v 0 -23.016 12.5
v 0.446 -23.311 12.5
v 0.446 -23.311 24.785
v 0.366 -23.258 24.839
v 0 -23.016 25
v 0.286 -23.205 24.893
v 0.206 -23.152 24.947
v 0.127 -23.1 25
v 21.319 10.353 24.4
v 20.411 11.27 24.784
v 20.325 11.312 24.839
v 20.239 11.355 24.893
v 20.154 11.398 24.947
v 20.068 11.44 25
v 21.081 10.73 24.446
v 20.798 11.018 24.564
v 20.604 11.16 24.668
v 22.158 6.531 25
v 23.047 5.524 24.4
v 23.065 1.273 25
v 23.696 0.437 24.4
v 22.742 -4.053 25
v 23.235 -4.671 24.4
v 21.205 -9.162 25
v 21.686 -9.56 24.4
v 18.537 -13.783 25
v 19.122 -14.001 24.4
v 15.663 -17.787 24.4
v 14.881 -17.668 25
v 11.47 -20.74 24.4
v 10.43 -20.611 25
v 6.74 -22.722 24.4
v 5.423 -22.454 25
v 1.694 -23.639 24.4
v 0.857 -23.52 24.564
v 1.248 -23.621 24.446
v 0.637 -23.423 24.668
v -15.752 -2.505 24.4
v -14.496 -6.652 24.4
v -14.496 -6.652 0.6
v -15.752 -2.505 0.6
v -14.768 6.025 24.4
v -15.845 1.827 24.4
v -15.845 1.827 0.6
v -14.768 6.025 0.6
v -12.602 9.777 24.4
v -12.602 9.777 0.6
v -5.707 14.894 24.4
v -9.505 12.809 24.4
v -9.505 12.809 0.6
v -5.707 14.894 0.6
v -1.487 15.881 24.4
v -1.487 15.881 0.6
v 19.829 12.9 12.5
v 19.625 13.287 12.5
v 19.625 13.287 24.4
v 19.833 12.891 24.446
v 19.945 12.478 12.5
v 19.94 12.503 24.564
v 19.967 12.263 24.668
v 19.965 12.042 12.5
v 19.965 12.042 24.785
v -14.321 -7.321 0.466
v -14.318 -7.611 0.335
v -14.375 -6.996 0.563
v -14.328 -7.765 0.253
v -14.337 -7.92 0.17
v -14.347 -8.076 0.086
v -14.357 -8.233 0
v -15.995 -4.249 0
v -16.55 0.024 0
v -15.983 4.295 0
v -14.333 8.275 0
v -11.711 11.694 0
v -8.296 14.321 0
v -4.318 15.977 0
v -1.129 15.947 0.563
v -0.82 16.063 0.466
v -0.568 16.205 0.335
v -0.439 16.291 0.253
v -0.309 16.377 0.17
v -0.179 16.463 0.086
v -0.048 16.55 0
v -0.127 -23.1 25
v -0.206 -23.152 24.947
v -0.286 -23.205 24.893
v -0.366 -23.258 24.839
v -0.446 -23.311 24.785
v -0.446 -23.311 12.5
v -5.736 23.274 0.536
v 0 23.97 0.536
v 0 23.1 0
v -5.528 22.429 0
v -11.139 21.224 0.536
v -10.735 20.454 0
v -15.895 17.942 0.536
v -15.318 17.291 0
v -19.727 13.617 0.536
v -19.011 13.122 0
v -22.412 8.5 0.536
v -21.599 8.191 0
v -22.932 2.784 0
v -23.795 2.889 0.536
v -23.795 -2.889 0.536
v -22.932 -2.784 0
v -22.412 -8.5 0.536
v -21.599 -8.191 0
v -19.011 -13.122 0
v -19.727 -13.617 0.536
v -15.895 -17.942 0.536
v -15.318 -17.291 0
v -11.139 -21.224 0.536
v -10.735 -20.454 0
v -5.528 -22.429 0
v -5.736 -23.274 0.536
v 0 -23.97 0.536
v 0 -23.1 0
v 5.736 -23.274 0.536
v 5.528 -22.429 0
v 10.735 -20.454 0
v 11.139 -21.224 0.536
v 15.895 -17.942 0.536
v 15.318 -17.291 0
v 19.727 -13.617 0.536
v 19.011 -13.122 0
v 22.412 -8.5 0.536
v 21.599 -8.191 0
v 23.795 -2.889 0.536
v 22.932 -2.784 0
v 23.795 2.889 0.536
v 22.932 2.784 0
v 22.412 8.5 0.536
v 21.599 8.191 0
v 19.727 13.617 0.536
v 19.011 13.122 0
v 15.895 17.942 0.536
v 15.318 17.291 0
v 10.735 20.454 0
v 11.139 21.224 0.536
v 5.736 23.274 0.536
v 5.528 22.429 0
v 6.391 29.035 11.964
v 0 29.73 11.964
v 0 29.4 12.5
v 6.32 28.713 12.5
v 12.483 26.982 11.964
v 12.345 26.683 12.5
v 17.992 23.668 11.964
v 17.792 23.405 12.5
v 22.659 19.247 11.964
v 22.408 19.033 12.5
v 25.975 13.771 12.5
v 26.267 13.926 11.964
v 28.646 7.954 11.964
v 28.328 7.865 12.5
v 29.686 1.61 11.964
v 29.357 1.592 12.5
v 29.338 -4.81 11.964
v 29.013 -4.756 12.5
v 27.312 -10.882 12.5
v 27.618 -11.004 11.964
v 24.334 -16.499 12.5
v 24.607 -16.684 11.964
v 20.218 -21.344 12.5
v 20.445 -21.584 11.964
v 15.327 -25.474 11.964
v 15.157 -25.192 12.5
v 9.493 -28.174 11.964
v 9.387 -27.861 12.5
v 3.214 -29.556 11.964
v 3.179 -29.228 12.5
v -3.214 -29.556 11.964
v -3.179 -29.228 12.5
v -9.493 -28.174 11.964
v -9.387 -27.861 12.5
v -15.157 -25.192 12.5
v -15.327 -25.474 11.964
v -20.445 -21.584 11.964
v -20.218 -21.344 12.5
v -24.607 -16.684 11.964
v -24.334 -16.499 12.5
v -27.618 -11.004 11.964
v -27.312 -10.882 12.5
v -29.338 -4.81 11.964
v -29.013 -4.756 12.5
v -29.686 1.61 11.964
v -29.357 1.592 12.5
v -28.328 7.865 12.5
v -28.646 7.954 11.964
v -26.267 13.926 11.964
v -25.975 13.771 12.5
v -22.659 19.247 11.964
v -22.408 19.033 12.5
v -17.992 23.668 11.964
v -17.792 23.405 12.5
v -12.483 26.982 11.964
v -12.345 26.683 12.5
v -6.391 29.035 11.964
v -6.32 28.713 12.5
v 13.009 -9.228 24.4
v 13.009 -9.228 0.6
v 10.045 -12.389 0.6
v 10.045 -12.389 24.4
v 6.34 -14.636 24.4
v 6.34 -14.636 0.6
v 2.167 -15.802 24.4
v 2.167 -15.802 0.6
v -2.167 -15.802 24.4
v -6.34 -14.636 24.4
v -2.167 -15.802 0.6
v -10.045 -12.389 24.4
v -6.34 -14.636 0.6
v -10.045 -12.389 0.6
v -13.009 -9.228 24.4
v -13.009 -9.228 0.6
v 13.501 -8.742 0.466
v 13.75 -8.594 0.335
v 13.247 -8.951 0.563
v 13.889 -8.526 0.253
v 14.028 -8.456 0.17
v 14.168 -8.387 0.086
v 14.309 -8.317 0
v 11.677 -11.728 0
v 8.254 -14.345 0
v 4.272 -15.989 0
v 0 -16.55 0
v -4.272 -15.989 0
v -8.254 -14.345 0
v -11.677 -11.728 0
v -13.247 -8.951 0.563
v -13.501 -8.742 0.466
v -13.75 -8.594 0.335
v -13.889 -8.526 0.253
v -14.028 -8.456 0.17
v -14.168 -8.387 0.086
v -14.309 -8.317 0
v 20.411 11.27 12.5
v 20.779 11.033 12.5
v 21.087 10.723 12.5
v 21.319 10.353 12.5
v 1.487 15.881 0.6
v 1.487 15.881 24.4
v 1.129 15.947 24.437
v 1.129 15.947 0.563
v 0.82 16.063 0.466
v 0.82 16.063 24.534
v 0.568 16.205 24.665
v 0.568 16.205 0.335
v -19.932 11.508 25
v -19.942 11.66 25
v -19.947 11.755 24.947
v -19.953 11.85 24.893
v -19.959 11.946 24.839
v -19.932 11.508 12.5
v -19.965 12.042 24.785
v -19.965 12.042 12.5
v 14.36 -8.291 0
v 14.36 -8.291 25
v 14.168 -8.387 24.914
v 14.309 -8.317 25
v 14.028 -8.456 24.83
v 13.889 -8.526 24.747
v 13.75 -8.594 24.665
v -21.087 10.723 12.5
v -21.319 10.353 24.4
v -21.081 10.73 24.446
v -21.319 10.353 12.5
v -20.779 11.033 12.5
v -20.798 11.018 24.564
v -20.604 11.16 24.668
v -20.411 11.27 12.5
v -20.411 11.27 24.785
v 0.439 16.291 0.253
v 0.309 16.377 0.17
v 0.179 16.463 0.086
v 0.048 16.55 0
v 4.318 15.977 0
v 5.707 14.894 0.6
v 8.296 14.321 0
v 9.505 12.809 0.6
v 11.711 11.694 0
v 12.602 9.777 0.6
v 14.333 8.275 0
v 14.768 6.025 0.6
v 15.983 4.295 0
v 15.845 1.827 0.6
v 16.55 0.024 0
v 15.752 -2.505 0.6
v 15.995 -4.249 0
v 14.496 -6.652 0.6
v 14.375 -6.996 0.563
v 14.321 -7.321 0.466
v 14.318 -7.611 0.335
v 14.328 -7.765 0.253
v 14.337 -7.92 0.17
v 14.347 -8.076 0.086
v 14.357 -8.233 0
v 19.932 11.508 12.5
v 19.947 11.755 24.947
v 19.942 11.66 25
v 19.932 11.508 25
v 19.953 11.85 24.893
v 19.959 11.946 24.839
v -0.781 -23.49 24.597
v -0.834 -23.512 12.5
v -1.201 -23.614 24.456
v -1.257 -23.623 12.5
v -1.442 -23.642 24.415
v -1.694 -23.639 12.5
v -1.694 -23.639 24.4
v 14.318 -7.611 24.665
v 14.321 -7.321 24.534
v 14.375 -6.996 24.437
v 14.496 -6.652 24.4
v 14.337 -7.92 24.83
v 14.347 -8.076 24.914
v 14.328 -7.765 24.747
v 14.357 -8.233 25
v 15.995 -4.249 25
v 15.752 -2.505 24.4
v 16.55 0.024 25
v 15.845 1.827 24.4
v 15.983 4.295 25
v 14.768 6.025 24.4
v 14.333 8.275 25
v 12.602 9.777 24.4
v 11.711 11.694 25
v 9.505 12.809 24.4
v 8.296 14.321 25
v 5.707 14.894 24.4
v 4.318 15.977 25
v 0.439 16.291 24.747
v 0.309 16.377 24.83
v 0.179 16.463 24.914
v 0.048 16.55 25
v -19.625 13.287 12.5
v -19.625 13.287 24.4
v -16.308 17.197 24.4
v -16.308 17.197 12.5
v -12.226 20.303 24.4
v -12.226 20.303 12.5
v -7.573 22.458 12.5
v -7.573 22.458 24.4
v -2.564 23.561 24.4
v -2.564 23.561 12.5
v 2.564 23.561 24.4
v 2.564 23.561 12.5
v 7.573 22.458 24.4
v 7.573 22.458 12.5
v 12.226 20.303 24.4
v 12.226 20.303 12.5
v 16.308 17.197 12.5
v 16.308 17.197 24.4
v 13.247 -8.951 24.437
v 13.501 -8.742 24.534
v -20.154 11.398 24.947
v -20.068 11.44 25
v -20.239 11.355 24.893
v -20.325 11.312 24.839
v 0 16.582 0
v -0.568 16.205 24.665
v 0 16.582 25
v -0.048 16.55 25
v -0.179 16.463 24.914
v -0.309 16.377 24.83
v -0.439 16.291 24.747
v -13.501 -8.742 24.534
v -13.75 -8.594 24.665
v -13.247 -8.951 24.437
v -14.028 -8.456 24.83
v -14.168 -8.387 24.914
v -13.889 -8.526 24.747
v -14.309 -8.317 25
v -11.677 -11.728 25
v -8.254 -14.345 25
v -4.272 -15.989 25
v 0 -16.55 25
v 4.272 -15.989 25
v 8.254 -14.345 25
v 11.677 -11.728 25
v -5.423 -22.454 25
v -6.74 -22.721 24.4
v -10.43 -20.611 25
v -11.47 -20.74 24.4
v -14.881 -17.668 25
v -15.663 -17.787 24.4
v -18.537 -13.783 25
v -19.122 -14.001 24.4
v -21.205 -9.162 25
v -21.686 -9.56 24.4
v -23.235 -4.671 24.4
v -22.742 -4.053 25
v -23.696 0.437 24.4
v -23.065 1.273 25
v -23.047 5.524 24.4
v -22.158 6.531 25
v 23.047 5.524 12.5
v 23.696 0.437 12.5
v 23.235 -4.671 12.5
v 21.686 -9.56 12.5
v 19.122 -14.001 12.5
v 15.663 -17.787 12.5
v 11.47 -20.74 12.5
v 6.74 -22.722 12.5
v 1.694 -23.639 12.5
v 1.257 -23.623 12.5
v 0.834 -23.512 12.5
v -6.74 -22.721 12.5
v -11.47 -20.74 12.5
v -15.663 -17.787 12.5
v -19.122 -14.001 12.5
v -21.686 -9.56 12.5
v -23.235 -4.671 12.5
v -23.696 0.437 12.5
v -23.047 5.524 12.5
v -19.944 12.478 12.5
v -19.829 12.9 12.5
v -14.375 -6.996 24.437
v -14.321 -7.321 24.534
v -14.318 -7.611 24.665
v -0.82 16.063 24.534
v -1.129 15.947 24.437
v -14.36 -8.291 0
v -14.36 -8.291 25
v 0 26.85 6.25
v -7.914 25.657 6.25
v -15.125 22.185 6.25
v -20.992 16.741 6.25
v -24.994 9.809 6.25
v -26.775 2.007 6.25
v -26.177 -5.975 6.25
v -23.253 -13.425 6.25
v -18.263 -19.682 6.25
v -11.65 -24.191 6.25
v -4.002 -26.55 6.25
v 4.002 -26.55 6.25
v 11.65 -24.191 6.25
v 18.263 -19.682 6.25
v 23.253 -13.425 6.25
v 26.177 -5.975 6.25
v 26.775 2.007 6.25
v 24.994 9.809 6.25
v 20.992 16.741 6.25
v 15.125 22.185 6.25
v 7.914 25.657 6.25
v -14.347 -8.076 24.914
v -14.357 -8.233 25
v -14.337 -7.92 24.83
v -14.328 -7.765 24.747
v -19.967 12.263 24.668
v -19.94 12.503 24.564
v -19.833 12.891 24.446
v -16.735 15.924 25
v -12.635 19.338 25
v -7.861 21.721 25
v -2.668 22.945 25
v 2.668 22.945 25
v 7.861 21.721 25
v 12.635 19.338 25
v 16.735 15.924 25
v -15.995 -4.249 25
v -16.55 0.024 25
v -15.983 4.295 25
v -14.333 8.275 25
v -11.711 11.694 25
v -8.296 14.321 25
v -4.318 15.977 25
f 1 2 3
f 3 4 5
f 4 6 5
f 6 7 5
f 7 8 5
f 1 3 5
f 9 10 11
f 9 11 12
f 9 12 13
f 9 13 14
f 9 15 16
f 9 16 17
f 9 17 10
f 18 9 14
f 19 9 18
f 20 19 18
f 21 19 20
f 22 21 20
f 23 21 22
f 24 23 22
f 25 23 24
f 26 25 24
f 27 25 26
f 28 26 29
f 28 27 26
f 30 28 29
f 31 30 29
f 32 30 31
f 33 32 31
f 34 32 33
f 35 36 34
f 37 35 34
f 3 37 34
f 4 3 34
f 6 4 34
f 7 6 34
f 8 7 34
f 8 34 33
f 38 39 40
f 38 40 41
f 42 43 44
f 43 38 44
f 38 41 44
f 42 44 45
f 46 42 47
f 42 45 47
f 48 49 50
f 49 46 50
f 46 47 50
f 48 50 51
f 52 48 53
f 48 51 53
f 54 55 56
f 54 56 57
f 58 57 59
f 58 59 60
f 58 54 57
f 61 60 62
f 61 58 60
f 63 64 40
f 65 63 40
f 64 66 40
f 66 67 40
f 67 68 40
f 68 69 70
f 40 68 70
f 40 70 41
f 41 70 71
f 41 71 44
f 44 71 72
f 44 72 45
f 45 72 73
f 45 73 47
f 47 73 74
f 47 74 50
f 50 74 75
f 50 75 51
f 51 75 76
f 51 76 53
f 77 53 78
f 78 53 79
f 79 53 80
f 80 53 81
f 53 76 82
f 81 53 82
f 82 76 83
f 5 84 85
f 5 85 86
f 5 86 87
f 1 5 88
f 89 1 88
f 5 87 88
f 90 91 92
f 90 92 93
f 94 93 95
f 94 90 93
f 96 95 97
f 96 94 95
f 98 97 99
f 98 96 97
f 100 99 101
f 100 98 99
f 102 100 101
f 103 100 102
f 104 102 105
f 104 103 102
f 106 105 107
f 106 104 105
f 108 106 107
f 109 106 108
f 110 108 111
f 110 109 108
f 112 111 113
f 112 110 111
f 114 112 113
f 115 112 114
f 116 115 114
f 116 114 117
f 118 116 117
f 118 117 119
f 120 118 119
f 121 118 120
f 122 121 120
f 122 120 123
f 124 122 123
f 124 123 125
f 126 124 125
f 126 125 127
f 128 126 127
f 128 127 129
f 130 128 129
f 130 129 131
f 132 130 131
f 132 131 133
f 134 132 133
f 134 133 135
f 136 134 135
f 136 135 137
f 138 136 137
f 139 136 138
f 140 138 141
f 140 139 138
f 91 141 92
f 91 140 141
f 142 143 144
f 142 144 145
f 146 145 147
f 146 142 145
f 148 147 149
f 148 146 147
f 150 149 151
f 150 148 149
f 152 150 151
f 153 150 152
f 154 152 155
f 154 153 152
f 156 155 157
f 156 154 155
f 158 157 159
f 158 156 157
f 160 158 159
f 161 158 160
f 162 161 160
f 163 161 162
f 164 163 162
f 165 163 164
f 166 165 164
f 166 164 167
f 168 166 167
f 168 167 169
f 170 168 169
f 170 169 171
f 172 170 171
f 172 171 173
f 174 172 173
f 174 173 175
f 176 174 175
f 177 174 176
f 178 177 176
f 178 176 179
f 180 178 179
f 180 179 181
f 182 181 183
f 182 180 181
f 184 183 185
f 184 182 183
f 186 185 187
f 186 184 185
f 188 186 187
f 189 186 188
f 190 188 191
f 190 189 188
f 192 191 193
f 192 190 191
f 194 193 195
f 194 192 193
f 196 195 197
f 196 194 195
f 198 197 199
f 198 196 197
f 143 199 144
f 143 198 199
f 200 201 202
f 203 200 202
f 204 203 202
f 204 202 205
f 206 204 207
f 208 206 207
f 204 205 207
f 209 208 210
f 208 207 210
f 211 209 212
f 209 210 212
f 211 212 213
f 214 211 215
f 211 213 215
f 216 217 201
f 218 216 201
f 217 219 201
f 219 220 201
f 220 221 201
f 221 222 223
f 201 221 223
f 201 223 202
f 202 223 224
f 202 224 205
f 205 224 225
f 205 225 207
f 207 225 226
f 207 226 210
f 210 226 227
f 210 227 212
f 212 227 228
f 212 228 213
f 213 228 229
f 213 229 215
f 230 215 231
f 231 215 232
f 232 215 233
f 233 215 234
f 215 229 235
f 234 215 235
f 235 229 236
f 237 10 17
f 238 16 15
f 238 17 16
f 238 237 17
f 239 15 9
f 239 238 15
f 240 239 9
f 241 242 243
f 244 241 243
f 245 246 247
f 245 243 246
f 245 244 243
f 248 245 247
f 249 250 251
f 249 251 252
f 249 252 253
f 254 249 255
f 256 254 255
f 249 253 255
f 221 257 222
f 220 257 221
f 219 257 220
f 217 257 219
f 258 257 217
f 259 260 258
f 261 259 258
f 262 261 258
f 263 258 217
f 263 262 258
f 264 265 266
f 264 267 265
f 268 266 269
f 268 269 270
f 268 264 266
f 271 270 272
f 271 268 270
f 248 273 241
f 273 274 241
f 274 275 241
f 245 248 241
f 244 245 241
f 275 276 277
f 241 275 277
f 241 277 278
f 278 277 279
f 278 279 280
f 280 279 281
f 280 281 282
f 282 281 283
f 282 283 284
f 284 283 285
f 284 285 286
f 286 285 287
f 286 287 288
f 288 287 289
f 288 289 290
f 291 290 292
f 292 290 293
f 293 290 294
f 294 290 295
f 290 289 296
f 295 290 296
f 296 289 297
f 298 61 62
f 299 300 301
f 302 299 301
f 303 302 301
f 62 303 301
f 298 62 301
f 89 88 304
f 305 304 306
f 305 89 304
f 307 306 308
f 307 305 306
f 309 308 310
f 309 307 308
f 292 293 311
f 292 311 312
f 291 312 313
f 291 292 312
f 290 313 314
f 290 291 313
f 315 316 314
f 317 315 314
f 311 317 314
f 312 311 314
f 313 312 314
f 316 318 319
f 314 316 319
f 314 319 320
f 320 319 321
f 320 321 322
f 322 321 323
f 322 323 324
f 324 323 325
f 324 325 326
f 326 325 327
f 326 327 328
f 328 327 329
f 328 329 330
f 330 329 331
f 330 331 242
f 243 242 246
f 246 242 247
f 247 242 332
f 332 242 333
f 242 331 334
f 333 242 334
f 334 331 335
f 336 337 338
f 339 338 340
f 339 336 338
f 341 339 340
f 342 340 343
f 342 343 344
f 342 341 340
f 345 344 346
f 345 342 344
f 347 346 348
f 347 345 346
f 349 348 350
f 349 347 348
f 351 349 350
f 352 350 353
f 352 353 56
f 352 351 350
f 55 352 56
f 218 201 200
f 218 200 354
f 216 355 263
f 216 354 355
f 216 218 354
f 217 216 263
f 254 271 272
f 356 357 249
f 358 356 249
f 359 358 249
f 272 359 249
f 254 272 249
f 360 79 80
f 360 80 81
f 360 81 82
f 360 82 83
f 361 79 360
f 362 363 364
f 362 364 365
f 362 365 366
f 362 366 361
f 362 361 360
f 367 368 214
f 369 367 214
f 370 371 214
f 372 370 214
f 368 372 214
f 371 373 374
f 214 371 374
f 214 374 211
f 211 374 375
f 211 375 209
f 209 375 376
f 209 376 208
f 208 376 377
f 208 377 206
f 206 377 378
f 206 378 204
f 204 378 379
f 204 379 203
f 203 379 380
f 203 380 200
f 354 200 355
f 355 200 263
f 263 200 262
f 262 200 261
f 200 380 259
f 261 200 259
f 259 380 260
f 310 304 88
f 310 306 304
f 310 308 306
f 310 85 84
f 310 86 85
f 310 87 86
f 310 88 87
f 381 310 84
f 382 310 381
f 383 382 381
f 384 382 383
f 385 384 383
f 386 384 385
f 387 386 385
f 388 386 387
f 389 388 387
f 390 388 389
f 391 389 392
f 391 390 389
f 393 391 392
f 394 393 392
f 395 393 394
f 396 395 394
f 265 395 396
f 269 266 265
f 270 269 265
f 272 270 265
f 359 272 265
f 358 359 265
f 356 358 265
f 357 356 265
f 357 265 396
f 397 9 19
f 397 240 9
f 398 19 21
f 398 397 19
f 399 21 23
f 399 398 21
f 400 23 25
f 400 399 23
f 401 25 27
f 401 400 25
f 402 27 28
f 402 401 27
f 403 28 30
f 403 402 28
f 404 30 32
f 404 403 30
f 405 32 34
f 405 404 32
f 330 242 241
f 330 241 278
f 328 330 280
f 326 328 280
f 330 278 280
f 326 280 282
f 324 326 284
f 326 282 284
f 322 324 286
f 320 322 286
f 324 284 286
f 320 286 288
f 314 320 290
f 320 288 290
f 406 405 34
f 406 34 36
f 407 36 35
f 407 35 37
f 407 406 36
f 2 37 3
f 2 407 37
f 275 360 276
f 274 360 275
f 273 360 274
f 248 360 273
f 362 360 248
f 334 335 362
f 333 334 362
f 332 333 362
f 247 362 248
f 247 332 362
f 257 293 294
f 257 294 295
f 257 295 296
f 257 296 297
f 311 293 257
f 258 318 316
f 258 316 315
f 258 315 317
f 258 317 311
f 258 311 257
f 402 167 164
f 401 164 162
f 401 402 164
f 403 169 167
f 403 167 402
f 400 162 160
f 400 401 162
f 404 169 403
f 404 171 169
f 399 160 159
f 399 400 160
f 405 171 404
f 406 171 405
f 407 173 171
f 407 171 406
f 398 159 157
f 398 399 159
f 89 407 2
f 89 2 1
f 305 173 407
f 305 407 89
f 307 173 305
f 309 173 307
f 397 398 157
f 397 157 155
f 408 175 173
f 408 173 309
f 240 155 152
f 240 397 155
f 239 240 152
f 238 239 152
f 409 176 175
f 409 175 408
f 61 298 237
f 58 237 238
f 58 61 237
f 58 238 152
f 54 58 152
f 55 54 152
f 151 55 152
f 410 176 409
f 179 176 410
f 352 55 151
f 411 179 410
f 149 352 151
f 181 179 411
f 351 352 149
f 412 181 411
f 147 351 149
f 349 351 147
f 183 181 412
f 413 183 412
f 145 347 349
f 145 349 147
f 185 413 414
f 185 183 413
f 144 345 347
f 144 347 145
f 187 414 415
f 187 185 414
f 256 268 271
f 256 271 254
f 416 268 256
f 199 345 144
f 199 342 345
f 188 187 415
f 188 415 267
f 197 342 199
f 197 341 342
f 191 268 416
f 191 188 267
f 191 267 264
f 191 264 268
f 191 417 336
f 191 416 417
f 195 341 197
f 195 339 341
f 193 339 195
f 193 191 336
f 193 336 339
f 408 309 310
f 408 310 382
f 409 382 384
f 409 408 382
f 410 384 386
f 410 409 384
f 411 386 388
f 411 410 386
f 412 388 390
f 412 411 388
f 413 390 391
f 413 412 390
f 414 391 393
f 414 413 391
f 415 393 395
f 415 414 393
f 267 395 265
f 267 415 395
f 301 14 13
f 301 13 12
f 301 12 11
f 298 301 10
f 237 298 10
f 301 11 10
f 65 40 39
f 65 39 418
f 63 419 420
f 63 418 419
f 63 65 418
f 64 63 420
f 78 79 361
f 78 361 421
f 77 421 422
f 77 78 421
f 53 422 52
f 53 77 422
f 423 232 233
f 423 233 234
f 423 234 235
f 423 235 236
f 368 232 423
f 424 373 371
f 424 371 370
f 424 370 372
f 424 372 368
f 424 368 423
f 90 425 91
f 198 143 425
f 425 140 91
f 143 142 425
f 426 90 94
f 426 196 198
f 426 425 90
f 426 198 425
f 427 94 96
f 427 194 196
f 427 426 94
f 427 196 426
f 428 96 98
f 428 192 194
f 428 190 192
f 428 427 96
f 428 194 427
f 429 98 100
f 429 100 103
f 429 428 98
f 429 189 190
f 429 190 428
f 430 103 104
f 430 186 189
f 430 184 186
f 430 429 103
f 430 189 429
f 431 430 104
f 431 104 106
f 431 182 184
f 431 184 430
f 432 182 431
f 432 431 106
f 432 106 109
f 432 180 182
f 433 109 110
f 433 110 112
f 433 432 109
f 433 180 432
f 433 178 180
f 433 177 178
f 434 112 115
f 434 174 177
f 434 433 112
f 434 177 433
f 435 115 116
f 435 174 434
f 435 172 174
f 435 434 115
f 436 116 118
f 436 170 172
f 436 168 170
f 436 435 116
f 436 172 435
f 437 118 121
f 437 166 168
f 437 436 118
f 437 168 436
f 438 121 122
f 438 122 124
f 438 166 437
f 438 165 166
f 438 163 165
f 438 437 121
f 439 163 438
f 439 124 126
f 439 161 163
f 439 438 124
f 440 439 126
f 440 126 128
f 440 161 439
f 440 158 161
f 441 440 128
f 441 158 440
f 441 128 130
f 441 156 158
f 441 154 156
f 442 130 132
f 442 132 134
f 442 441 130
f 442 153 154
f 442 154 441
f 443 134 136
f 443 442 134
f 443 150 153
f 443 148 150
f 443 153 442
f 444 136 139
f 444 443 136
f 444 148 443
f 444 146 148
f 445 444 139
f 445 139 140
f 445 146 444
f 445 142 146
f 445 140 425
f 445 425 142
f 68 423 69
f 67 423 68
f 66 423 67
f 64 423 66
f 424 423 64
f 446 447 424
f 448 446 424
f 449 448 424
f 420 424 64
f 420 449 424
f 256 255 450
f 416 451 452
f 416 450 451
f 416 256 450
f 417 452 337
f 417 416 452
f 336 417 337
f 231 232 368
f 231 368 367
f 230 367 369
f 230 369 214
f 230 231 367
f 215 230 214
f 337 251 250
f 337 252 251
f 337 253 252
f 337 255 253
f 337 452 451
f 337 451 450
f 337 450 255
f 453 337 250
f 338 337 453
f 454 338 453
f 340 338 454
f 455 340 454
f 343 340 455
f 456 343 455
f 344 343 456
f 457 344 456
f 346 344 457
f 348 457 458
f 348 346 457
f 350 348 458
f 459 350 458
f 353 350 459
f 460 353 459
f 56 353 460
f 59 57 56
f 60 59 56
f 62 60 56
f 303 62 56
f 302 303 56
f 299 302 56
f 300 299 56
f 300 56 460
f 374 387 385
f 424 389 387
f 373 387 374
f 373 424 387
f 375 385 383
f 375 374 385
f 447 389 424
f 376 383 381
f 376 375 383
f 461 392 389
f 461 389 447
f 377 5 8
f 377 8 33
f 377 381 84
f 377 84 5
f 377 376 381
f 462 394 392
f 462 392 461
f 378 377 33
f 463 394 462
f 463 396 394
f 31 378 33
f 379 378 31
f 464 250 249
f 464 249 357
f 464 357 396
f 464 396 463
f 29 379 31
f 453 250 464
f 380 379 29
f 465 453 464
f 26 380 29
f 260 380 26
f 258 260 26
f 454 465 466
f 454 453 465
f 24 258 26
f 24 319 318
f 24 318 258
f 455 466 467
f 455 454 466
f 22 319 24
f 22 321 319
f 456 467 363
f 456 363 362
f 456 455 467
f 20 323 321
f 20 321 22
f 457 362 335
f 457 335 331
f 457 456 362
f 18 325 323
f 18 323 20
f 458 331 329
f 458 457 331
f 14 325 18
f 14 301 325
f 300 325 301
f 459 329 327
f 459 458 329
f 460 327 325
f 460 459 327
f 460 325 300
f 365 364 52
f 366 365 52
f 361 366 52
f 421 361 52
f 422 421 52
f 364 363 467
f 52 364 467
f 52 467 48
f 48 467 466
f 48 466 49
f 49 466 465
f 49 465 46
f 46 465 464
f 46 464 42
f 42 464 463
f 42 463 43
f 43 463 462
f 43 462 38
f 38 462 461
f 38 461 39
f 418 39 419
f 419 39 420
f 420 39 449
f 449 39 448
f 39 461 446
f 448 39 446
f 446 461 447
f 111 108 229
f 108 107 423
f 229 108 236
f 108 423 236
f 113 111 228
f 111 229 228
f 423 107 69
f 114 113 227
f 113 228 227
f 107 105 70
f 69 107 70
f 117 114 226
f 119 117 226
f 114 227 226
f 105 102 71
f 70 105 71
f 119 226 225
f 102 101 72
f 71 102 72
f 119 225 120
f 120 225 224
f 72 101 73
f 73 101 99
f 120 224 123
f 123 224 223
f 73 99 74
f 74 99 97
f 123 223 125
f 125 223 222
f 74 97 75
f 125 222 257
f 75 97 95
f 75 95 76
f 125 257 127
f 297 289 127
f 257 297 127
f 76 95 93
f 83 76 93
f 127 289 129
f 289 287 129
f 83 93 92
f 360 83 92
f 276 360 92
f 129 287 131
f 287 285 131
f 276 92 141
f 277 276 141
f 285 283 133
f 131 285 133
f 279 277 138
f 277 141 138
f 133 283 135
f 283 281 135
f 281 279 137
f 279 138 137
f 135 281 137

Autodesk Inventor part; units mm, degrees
ref_plane "YZ Plane" through (0, 0, 0) normal (1, 0, 0) x (0, 1, 0)
ref_plane "XZ Plane" through (0, 0, 0) normal (0, 1, 0) x (-1, 0, 0)
ref_plane "XY Plane" through (0, 0, 0) normal (0, 0, 1) x (1, 0, 0)
sketch "Sketch1" plane through (0, 0, 0) normal (0, 0, 1) x (1, 0, 0)
  circle A0 centre (0, 0) radius 15.95
  circle A1 centre (0, 0) radius 23.7
  dimension "d0" = 47.4
  dimension "d1" = 31.9
extrude "Extrusion1" add sketch "Sketch1" along normal blind 25
sketch "Sketch2" plane through (0, 0, 0) normal (1, 0, 0) x (0, 1, 0)
  line L0 (23.7, 0) -> (23.7, 25) projected
  line L1 (23.7, 0) -> (30, 12.5)
  line L2 (30, 12.5) -> (23.7, 12.5)
  line L3 (0, 0) -> (0, 25)
  line L4 (23.7, 25) -> (-23.7, 25) projected
  point P0 (0, 12.5)
  dimension "d4" = 12.5
  dimension "d5" = 60
revolve "Revolution1" add sketch "Sketch2" angle 360 about axis through (0, 0, 0) along (0, 0, 1)
sketch "Sketch3" plane through (0, 0, 25) normal (0, 0, 1) x (1, 0, 0)
  circle A0 centre (0, 0) radius 15.95 projected
  circle A1 centre (0, 0) radius 15.95 projected
  line L0 (-1, 15.9186) -> (0, 16.5819)
  line L1 (0, 16.5819) -> (1, 15.9186)
  line L2 (-1, 15.9186) -> (1, 15.9186)
  circle A2 centre (0, 0) radius 23.7 projected
  line L3 (20.0065, 12.7055) -> (19.9321, 11.5078)
  line L4 (19.9321, 11.5078) -> (21.0065, 10.9734)
  line L5 (20.0065, 12.7055) -> (21.0065, 10.9734)
  line L6 (20.5065, 11.8394) -> (0, 0) construction
  line L7 (0, 0) -> (0, 16.5819) construction
  dimension "d11" = 1.2
  dimension "d12" = 2
  dimension "d16" = 1.2
  dimension "d17" = 2
  dimension "d26" = 60
extrude "Extrusion2" cut sketch "Sketch3" against normal through all contours L2 A0 | A0 L0 L1 picked at (-0.1112, 15.9279)
extrude "Extrusion3" cut sketch "Sketch3" against normal up to surface (12.5 mm away) contours L5 A2 | L4 L3 L5
pattern_circular "Circular Pattern1" count 3 over 360 about axis through (0, 0, 0) along (0, 0, 1) of "Extrusion3"
pattern_circular "Circular Pattern2" count 3 over 360 about axis through (0, 0, 0) along (0, 0, 1) of "Extrusion2"
chamfer "Chamfer1" distance 0.6 angle 45 11 edges at (-13.8131, 7.975, 0) (0, -15.95, 0) (13.8131, 7.975, 0) (0, -23.7, 0) (0, -30, 12.5) (20.5248, -11.85, 25) (0, 23.7, 25) (-20.5248, -11.85, 25) (-13.8131, 7.975, 25) (0, -15.95, 25) (13.8131, 7.975, 25)
fillet "Fillet1" radius 2 12 edges at (-1, 15.9186, 12.5) (1, 15.9186, 12.5) (20.0065, 12.7055, 18.45) (21.0065, 10.9734, 18.45) (-1, -23.6789, 18.45) (1, -23.6789, 18.45) (-20.0065, 12.7055, 18.45) (-21.0065, 10.9734, 18.45) (-13.2859, -8.8253, 12.5) (-14.2859, -7.0933, 12.5) (13.2859, -8.8253, 12.5) (14.2859, -7.0933, 12.5)
properties part number "TouptekAdapterCylinder" material "ABS Plastic"
